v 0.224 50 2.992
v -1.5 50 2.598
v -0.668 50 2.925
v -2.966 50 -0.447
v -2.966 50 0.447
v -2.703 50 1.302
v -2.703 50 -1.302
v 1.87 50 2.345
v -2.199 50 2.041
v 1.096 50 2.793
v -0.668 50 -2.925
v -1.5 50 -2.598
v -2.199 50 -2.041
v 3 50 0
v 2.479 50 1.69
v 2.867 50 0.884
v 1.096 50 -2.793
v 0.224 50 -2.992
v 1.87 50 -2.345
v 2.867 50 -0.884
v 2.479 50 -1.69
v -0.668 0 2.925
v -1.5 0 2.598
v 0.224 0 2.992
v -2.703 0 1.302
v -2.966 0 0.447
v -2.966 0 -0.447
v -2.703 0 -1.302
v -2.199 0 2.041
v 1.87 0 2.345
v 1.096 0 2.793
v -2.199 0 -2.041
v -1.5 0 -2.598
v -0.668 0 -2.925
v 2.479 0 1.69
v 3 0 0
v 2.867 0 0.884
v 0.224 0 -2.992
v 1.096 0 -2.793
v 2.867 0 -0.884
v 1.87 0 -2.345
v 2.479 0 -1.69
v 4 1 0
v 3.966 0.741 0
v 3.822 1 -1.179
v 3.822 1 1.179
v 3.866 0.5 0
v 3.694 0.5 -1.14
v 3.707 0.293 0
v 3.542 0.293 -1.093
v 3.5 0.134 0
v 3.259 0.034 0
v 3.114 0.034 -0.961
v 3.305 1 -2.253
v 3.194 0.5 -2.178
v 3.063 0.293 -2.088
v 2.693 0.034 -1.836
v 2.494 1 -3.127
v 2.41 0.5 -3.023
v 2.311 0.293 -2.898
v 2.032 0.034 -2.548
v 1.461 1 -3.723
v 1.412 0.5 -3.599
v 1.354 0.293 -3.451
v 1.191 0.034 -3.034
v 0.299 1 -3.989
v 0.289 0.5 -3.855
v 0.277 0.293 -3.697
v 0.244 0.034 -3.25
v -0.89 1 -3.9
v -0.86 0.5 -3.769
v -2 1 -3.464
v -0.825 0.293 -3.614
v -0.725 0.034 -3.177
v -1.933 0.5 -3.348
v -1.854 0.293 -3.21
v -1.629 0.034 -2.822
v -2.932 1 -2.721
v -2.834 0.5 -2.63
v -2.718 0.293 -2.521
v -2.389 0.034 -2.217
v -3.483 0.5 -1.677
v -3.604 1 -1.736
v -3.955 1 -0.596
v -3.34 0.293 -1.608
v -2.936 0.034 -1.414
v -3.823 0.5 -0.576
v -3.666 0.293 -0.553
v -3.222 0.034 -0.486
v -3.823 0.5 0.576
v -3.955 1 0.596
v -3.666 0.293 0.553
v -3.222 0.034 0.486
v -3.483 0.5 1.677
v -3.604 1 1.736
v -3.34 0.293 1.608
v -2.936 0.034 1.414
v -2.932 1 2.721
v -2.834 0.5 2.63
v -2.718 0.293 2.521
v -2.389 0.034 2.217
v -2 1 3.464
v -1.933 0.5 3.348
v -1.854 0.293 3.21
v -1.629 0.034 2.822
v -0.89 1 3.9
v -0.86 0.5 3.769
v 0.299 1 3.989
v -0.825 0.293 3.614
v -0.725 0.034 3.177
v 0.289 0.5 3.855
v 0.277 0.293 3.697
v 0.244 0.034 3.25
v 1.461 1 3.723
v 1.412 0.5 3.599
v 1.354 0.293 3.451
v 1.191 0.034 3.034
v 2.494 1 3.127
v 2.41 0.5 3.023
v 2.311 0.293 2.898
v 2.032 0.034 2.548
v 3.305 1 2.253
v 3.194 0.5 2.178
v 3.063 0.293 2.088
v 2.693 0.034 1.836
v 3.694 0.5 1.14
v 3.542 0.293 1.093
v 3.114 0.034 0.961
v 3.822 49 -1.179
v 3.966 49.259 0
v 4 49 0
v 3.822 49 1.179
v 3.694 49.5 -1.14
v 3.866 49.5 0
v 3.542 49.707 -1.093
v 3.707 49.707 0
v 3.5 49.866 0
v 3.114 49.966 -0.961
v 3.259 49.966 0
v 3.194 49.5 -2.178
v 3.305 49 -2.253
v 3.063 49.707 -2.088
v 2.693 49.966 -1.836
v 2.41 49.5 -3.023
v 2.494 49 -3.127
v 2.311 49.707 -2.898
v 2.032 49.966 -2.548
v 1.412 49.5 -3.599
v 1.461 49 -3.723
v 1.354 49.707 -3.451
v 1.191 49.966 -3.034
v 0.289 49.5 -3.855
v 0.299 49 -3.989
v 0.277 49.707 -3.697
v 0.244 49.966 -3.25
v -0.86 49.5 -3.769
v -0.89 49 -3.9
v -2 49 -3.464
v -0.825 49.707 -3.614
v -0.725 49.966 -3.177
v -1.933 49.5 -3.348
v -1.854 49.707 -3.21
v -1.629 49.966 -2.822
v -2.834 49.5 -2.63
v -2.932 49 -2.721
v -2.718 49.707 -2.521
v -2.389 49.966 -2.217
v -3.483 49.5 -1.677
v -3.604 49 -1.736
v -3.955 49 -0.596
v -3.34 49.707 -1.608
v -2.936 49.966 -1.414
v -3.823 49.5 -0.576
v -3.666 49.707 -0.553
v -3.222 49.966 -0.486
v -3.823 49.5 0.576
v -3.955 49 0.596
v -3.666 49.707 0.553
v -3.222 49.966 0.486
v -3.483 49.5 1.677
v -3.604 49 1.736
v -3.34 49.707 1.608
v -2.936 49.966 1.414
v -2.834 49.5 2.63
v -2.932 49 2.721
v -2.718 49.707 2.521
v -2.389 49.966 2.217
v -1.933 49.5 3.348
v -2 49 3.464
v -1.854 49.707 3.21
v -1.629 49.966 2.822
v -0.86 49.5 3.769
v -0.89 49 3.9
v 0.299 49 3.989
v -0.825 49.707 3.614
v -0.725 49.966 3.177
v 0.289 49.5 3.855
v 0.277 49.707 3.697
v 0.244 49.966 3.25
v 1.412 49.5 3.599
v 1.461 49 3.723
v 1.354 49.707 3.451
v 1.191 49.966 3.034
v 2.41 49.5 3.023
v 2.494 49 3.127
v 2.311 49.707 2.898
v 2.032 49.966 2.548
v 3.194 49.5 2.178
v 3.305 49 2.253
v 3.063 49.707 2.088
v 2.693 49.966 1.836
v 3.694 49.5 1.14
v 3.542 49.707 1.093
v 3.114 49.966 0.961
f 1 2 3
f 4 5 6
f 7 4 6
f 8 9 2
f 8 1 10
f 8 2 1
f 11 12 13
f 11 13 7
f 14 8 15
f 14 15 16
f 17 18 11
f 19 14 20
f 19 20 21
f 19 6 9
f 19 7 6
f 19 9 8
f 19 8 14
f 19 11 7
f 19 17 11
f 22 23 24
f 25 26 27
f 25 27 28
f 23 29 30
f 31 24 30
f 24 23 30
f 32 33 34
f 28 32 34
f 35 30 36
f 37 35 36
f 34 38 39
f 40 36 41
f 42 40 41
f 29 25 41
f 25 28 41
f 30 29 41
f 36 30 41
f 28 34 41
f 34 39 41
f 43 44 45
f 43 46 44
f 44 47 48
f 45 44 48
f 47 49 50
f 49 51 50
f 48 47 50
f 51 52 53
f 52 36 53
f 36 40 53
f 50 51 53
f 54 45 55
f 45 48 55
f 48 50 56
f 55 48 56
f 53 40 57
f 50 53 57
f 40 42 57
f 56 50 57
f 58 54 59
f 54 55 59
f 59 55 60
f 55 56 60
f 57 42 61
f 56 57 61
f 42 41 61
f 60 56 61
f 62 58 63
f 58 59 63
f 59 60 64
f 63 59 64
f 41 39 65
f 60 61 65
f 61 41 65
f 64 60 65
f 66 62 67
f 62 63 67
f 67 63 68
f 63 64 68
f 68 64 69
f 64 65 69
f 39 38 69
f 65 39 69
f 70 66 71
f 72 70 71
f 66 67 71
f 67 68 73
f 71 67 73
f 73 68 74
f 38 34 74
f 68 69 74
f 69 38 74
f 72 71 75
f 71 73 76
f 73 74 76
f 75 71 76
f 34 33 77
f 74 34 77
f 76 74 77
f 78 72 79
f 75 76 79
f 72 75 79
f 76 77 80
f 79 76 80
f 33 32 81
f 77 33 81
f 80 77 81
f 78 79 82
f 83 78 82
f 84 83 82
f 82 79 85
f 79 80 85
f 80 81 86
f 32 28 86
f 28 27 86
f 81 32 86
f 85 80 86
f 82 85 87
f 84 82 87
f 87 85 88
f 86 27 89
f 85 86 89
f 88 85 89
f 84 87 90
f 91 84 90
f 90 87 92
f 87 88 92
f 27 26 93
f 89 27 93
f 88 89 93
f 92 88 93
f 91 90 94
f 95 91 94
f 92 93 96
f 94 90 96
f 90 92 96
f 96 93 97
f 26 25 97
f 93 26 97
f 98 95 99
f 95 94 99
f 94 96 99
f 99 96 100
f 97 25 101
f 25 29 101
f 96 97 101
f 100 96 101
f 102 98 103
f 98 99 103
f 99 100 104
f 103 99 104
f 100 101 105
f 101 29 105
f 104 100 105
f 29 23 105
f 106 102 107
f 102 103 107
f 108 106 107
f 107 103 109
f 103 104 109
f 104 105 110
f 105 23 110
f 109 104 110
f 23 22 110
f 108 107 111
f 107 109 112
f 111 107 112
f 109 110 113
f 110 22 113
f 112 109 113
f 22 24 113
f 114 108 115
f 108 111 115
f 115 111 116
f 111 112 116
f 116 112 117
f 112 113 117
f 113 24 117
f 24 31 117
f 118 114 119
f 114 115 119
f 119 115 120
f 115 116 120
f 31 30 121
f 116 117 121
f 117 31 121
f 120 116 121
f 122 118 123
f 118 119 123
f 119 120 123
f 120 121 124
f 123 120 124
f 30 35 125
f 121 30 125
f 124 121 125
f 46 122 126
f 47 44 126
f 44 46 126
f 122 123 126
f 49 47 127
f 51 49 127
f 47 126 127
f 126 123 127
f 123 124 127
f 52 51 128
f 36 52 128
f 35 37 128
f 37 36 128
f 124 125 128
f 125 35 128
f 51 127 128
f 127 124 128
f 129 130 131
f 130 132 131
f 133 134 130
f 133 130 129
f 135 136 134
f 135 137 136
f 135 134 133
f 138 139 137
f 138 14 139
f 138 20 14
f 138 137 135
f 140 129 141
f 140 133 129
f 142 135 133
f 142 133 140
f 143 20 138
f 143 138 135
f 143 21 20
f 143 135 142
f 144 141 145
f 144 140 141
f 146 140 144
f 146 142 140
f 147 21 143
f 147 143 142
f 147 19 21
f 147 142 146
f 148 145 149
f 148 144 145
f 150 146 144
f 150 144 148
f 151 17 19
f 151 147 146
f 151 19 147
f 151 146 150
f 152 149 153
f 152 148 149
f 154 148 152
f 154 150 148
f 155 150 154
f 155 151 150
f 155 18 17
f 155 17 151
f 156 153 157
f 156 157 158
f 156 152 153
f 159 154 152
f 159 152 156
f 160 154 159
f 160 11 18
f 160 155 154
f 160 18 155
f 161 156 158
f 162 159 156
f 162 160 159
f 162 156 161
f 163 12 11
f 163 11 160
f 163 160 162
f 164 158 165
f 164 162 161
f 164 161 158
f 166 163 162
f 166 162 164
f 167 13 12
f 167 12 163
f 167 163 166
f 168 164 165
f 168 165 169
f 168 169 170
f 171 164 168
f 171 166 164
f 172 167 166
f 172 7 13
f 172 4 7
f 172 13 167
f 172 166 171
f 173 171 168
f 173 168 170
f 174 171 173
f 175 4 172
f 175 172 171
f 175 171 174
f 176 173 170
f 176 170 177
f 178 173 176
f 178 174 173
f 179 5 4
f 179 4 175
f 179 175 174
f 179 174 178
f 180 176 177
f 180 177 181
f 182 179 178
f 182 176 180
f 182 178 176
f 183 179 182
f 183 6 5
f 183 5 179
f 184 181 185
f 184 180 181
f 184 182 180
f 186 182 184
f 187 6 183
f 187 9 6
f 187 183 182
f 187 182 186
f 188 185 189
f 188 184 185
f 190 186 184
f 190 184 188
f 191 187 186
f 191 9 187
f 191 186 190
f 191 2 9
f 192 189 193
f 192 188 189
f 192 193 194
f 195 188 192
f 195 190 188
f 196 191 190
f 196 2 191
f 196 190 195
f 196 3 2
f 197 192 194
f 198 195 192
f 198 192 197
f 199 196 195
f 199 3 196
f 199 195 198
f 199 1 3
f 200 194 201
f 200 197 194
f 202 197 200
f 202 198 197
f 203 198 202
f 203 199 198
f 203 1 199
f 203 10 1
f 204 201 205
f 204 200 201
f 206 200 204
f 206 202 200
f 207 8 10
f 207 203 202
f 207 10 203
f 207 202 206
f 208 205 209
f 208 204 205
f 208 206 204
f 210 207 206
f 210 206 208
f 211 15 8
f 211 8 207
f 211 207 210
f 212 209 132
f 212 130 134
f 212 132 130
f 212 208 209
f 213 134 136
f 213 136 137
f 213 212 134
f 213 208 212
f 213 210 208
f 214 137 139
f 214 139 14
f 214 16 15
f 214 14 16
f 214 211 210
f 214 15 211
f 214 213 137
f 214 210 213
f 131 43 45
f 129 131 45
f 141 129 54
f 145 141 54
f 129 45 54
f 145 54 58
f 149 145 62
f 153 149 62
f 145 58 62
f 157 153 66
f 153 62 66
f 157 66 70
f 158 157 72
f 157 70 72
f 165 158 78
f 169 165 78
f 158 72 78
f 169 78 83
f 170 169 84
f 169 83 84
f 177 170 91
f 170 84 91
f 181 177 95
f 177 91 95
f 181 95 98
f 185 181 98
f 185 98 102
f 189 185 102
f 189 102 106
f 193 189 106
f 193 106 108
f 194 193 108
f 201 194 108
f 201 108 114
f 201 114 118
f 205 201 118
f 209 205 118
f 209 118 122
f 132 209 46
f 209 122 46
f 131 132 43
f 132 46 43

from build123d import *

# Parameters (mm, degrees)
SKETCH1_R           = 4
BOSS_EXTRUDE1_DEPTH = 50
FILLET1_R           = 1
FILLET2_R           = 1


with BuildPart() as part:
    # Sketch1 → Boss-Extrude1 (new body)
    with BuildSketch(Plane(origin=(0, 0, 0), x_dir=(1, 0, 0), z_dir=(0, 1, 0))):
        Circle(SKETCH1_R)
    extrude(amount=BOSS_EXTRUDE1_DEPTH)

    # Fillet1
    fillet1_edges = [part.edges().sort_by_distance(p)[0] for p in [
        (-4, 50, 0),
    ]]
    fillet(fillet1_edges, radius=FILLET1_R)

    # Fillet2
    fillet2_edges = [part.edges().sort_by_distance(p)[0] for p in [
        (-4, 0, 0),
    ]]
    fillet(fillet2_edges, radius=FILLET2_R)


solid = part.part
